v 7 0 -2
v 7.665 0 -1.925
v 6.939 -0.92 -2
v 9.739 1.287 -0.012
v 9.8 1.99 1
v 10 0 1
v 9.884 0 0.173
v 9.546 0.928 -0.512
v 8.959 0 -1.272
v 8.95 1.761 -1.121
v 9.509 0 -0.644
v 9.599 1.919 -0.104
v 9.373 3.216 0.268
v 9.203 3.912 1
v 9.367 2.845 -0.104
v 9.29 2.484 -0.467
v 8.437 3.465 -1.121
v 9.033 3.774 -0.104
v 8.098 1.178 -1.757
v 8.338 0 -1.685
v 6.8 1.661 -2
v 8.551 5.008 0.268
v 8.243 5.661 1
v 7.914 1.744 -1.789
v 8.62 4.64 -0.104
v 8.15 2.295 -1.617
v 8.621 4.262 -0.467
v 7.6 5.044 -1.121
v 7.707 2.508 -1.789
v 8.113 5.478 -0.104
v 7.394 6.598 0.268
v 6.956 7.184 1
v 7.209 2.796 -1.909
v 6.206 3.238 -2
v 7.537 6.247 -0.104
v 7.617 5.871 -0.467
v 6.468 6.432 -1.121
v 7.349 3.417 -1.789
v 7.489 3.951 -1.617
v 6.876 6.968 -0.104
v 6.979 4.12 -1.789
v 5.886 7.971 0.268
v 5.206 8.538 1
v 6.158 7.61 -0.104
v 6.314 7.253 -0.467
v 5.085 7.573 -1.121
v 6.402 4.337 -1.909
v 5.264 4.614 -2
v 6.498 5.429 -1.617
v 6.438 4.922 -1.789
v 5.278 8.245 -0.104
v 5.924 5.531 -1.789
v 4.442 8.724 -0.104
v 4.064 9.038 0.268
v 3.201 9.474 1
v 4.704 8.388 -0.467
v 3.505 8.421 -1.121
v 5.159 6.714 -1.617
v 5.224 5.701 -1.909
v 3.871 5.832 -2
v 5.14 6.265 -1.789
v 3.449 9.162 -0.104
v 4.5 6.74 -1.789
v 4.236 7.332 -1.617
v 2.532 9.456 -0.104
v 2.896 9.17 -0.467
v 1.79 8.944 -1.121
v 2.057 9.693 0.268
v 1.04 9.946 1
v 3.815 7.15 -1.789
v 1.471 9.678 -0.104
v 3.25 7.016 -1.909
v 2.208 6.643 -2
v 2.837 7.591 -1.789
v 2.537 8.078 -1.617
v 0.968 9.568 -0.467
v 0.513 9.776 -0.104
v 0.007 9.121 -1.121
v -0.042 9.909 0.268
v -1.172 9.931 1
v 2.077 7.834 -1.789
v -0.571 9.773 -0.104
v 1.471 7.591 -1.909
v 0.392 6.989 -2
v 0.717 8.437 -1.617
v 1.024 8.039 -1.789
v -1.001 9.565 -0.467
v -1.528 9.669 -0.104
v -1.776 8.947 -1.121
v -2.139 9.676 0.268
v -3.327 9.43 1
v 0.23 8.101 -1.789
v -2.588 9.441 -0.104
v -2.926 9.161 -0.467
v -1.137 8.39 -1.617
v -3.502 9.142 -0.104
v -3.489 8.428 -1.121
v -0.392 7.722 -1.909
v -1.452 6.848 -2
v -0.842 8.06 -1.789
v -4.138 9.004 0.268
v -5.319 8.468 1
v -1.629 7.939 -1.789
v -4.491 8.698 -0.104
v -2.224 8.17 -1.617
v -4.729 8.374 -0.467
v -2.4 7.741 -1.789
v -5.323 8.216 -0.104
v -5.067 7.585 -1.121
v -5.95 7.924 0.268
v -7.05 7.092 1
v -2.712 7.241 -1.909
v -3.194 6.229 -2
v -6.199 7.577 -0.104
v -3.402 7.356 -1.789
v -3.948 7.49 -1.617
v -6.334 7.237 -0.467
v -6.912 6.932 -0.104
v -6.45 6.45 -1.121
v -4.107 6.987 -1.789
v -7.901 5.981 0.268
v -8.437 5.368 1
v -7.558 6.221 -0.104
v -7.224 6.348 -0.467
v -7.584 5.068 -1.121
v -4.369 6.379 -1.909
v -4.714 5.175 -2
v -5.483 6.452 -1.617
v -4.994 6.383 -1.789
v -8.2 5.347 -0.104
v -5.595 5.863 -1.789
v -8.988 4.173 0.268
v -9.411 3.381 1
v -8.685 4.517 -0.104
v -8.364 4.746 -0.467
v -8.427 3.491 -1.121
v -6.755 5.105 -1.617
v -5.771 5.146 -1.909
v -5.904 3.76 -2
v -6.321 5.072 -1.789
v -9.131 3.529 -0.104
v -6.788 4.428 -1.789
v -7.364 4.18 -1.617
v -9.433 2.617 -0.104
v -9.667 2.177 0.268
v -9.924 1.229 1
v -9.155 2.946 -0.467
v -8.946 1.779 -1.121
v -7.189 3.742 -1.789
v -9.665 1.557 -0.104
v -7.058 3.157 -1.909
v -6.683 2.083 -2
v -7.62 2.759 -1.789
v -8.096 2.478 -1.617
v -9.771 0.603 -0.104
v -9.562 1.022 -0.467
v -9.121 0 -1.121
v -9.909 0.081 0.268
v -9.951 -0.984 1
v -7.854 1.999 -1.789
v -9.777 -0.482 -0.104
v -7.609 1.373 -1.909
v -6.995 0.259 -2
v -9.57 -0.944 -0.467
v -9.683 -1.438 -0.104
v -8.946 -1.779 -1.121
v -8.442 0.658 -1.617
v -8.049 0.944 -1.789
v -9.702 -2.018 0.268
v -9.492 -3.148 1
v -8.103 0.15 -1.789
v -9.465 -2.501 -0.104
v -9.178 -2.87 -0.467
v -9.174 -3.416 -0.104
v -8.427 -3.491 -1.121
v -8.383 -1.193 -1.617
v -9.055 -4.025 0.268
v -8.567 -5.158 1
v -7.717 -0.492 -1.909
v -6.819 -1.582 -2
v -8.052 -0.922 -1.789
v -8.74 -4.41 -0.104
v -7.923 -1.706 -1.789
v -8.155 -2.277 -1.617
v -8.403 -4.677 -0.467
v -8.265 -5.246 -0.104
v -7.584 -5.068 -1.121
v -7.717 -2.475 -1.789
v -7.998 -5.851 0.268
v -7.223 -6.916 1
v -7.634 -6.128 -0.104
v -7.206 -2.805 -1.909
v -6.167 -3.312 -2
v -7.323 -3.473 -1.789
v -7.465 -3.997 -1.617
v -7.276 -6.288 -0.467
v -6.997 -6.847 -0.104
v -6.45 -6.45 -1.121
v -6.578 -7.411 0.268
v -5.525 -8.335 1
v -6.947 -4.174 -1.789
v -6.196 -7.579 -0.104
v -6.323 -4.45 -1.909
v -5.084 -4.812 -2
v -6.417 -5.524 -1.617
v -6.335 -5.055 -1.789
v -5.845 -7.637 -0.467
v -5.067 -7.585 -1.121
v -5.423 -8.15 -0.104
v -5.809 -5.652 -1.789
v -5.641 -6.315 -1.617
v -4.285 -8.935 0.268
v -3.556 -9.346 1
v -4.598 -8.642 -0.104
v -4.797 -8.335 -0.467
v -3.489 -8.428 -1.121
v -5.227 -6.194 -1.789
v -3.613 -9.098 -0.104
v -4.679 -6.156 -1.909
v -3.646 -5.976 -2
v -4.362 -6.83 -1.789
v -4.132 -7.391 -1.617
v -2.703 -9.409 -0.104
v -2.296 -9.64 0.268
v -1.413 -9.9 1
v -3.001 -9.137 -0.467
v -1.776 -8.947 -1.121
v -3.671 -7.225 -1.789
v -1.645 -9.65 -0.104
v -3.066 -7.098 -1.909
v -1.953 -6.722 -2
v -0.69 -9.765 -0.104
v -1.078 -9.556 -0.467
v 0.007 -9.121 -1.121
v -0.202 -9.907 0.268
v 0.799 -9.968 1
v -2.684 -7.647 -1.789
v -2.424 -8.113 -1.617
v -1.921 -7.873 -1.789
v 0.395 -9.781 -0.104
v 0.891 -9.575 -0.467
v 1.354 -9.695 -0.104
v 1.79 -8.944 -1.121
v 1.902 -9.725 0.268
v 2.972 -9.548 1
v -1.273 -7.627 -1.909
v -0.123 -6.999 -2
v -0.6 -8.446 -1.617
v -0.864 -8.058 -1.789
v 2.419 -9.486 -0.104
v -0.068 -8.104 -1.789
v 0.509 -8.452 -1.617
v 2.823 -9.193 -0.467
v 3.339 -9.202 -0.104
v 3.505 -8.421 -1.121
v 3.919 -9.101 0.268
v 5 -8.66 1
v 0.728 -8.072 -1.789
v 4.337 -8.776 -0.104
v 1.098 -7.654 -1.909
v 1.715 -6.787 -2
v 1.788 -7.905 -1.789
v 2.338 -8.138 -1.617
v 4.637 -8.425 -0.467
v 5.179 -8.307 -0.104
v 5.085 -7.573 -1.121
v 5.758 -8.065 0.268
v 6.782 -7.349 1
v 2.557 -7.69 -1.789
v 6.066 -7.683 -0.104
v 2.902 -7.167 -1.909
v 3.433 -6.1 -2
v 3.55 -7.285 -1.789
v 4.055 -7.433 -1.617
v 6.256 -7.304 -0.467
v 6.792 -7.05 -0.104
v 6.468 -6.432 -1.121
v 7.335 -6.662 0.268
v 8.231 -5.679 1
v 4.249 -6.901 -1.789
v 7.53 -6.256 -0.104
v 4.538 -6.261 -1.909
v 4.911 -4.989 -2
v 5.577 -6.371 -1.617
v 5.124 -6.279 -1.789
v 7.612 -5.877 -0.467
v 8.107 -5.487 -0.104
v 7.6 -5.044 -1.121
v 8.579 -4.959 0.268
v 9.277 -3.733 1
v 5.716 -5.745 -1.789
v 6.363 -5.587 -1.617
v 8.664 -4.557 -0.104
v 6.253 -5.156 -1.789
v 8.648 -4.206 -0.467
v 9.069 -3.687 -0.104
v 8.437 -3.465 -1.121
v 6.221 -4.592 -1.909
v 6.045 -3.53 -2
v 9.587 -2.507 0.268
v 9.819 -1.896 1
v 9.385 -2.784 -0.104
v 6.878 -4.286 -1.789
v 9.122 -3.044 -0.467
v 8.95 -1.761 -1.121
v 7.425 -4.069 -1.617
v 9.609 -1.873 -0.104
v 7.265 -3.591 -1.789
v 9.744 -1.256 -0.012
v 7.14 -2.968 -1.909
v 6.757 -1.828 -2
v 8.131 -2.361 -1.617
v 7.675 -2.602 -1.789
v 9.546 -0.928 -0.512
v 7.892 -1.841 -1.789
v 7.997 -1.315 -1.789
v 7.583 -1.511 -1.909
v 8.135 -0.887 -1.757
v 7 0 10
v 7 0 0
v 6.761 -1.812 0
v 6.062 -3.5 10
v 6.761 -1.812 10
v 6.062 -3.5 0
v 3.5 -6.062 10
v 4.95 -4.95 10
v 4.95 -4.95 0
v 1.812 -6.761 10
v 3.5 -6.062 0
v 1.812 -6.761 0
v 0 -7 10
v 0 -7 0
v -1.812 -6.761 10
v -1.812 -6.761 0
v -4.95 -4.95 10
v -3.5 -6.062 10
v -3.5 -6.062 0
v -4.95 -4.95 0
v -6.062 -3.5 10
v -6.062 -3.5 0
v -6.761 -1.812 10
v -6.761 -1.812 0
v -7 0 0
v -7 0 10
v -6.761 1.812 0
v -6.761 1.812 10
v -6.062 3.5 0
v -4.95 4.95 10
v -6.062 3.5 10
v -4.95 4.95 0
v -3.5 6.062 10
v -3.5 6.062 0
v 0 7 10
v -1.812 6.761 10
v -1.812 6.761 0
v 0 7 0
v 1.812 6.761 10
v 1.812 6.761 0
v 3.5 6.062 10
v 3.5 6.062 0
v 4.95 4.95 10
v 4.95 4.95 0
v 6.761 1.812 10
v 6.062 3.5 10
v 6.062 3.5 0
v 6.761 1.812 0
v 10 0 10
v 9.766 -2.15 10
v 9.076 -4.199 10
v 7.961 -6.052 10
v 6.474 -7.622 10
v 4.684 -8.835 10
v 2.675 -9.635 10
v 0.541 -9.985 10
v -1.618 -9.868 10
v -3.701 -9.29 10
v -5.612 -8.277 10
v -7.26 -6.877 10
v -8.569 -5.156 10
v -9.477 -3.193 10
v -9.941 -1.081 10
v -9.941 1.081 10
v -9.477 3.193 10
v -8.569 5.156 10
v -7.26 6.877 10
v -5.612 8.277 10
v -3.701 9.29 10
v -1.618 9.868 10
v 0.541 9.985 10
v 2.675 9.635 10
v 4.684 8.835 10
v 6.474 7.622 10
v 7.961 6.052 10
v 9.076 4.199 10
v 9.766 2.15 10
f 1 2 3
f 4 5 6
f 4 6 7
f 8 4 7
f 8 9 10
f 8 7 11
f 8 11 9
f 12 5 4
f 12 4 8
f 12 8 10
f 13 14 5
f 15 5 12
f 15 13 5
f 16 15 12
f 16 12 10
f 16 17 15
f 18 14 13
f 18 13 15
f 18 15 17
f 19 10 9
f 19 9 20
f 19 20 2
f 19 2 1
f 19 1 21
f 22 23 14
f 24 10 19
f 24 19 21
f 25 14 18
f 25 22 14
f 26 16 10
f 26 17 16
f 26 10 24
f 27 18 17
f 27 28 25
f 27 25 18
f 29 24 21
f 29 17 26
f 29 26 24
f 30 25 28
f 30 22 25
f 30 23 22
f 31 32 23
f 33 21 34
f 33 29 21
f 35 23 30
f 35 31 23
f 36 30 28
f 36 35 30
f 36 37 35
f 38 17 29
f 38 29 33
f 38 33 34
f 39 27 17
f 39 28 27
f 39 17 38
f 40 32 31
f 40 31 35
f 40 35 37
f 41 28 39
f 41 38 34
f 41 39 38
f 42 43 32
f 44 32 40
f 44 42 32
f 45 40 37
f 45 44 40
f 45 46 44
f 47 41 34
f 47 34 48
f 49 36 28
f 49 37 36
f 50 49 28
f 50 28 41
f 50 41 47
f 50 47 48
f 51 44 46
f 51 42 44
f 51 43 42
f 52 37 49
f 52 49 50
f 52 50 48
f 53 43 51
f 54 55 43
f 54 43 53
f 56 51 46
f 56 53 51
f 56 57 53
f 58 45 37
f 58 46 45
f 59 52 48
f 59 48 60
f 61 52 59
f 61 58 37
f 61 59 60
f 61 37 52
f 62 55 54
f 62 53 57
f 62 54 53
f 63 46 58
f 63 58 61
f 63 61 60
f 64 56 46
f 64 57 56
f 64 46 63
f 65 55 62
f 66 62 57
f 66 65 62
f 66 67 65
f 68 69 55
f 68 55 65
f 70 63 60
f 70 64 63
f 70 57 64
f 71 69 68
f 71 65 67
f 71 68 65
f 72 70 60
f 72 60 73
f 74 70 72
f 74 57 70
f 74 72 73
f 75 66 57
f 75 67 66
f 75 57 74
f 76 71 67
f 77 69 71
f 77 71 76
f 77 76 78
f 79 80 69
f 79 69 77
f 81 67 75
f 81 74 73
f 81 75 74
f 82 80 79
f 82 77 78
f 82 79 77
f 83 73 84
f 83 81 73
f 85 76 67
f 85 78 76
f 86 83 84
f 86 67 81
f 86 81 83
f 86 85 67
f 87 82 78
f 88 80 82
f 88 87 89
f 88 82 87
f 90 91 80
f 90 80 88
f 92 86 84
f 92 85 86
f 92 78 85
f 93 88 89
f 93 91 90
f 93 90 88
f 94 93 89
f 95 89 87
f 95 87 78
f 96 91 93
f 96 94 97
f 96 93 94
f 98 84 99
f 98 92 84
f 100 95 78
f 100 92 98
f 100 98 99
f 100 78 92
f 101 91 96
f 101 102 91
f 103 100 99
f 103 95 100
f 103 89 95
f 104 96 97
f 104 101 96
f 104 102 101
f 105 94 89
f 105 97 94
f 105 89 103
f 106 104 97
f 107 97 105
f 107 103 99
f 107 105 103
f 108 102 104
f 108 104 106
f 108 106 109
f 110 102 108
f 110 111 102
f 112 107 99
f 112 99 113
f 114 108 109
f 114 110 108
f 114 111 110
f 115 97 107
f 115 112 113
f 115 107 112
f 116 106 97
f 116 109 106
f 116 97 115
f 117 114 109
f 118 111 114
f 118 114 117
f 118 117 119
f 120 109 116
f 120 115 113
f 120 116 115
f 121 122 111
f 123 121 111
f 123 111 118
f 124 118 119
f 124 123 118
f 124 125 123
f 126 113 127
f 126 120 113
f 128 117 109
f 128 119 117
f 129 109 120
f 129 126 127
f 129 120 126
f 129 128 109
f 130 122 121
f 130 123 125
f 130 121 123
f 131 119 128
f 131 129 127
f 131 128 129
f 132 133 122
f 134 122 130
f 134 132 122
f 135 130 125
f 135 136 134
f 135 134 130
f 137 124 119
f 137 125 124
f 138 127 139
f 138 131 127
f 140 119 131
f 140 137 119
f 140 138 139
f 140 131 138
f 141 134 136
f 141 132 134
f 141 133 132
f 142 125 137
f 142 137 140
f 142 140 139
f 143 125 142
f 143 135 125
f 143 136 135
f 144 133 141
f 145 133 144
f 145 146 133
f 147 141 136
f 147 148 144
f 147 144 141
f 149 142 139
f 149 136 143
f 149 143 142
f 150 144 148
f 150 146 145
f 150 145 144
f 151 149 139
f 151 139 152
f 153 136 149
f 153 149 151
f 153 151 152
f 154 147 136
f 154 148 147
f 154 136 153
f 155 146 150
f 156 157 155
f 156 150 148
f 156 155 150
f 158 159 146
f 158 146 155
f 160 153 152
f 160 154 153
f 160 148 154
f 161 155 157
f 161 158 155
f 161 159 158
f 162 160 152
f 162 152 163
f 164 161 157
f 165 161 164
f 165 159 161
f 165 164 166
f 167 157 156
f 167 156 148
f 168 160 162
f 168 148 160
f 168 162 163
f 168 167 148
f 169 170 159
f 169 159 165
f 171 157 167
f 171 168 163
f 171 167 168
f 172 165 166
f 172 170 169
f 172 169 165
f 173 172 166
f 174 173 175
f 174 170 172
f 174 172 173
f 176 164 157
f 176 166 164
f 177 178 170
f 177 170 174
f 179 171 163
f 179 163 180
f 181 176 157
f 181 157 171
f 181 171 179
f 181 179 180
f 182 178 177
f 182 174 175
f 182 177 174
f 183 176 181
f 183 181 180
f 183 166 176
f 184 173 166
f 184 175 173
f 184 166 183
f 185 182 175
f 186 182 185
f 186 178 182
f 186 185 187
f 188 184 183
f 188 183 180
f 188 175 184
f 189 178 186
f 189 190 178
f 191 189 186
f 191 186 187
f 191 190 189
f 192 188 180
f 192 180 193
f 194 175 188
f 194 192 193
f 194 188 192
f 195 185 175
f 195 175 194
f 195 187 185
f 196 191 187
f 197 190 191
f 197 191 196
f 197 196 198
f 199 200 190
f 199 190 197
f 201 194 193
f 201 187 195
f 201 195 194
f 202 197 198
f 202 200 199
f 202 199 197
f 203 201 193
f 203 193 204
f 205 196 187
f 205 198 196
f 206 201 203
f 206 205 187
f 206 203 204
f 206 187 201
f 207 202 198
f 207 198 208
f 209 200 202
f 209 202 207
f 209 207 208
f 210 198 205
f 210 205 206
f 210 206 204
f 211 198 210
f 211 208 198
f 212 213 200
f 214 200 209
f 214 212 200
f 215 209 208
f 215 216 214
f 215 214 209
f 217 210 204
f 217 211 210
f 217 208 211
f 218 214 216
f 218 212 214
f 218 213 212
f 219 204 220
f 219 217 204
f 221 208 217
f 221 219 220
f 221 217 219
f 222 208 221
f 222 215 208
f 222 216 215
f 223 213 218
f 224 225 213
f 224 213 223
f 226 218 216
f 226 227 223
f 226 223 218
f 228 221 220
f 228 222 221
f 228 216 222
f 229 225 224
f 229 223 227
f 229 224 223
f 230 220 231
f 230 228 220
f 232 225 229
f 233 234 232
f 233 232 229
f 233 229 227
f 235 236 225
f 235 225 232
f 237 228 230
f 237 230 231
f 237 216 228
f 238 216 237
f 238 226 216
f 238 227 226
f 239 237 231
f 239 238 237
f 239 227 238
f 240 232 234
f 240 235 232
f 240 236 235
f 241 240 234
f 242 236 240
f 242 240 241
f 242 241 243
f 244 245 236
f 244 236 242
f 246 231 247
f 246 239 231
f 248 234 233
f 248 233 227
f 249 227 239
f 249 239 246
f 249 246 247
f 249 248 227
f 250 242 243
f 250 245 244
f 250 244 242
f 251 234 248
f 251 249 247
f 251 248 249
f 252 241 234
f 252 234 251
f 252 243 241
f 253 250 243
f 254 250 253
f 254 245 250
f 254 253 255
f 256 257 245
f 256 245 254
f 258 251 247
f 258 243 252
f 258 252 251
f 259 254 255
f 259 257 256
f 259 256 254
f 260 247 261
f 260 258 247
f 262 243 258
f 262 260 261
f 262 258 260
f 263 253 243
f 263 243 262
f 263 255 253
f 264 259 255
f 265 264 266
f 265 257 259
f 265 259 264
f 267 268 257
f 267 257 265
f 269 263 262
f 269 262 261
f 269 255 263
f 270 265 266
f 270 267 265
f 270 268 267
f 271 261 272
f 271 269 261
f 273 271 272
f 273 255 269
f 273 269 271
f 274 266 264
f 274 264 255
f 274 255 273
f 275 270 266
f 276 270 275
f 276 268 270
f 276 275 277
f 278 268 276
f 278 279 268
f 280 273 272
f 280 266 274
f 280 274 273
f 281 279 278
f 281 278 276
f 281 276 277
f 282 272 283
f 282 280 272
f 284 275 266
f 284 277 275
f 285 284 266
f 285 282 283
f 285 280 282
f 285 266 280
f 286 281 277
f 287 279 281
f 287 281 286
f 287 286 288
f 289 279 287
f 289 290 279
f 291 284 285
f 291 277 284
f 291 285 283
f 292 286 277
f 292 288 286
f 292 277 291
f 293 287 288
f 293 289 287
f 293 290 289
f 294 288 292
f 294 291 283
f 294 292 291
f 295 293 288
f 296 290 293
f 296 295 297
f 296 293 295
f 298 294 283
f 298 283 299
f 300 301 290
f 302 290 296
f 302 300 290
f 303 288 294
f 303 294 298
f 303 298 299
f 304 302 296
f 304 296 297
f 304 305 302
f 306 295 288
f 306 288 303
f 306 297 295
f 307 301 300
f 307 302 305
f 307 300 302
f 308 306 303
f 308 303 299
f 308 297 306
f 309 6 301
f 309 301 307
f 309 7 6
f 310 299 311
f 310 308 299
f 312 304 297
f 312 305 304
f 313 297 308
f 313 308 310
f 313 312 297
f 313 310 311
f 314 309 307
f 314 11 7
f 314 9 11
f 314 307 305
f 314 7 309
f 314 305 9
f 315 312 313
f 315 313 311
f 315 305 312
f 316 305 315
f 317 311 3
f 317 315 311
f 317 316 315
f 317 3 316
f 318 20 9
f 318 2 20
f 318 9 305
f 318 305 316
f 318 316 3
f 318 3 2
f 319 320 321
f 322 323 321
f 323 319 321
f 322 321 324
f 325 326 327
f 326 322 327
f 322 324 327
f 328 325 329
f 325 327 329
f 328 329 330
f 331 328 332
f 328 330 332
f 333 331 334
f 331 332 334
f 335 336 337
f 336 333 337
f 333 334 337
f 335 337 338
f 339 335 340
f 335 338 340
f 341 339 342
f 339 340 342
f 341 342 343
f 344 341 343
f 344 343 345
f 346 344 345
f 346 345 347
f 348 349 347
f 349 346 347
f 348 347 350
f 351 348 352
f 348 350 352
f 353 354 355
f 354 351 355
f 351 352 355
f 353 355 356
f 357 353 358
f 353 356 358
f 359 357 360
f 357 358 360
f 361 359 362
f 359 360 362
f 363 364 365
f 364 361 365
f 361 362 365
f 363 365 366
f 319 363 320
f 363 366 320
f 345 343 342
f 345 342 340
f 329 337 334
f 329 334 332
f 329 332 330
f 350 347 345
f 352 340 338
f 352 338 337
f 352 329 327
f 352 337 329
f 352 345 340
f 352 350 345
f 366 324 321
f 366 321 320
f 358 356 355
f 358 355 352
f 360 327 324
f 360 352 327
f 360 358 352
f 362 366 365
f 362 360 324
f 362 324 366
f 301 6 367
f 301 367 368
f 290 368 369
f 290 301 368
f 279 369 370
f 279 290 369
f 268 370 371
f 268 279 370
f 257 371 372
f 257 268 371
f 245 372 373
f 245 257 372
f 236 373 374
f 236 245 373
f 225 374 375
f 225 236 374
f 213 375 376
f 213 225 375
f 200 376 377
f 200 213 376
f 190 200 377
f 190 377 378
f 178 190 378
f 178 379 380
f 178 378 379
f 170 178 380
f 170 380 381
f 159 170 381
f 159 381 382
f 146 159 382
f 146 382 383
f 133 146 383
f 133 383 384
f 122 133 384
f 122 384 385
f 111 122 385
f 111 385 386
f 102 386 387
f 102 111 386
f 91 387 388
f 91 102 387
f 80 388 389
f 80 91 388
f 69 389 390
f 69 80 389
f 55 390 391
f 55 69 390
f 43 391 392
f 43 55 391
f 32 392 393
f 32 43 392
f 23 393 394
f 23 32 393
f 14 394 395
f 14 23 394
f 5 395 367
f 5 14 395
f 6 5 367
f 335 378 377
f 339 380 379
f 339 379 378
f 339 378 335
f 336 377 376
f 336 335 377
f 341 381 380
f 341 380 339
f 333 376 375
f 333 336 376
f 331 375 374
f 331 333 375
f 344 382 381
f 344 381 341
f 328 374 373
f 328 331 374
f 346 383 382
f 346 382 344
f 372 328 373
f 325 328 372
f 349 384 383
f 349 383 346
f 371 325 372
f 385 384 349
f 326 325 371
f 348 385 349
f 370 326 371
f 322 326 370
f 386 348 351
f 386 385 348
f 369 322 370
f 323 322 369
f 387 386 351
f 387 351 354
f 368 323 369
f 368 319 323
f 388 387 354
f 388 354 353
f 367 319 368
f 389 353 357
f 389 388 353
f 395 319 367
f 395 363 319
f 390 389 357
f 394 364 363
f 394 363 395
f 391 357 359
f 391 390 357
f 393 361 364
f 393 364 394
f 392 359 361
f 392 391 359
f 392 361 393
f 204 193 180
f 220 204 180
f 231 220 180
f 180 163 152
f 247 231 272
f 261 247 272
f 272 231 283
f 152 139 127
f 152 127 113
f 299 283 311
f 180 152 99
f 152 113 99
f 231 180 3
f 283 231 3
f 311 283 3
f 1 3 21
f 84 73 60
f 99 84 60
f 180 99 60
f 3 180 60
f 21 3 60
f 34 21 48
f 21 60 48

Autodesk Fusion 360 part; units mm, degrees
sketch "Sketch1" plane through (0, 0, 0) normal (0, 0, 1) x (1, 0, 0)
  circle A0 centre (0, 0) radius 7
  circle A1 centre (0, 0) radius 10
  dimension "d1" = 3
  dimension "d2" = 14
extrude "Extrude1" add sketch "Sketch1" along normal blind 10
extrude "Extrude2" add sketch "Sketch1" against normal blind 2 contours A0 | A1
fillet "Fillet1" radius 3 1 edges at (-9.3233, 3.6162, -2)
